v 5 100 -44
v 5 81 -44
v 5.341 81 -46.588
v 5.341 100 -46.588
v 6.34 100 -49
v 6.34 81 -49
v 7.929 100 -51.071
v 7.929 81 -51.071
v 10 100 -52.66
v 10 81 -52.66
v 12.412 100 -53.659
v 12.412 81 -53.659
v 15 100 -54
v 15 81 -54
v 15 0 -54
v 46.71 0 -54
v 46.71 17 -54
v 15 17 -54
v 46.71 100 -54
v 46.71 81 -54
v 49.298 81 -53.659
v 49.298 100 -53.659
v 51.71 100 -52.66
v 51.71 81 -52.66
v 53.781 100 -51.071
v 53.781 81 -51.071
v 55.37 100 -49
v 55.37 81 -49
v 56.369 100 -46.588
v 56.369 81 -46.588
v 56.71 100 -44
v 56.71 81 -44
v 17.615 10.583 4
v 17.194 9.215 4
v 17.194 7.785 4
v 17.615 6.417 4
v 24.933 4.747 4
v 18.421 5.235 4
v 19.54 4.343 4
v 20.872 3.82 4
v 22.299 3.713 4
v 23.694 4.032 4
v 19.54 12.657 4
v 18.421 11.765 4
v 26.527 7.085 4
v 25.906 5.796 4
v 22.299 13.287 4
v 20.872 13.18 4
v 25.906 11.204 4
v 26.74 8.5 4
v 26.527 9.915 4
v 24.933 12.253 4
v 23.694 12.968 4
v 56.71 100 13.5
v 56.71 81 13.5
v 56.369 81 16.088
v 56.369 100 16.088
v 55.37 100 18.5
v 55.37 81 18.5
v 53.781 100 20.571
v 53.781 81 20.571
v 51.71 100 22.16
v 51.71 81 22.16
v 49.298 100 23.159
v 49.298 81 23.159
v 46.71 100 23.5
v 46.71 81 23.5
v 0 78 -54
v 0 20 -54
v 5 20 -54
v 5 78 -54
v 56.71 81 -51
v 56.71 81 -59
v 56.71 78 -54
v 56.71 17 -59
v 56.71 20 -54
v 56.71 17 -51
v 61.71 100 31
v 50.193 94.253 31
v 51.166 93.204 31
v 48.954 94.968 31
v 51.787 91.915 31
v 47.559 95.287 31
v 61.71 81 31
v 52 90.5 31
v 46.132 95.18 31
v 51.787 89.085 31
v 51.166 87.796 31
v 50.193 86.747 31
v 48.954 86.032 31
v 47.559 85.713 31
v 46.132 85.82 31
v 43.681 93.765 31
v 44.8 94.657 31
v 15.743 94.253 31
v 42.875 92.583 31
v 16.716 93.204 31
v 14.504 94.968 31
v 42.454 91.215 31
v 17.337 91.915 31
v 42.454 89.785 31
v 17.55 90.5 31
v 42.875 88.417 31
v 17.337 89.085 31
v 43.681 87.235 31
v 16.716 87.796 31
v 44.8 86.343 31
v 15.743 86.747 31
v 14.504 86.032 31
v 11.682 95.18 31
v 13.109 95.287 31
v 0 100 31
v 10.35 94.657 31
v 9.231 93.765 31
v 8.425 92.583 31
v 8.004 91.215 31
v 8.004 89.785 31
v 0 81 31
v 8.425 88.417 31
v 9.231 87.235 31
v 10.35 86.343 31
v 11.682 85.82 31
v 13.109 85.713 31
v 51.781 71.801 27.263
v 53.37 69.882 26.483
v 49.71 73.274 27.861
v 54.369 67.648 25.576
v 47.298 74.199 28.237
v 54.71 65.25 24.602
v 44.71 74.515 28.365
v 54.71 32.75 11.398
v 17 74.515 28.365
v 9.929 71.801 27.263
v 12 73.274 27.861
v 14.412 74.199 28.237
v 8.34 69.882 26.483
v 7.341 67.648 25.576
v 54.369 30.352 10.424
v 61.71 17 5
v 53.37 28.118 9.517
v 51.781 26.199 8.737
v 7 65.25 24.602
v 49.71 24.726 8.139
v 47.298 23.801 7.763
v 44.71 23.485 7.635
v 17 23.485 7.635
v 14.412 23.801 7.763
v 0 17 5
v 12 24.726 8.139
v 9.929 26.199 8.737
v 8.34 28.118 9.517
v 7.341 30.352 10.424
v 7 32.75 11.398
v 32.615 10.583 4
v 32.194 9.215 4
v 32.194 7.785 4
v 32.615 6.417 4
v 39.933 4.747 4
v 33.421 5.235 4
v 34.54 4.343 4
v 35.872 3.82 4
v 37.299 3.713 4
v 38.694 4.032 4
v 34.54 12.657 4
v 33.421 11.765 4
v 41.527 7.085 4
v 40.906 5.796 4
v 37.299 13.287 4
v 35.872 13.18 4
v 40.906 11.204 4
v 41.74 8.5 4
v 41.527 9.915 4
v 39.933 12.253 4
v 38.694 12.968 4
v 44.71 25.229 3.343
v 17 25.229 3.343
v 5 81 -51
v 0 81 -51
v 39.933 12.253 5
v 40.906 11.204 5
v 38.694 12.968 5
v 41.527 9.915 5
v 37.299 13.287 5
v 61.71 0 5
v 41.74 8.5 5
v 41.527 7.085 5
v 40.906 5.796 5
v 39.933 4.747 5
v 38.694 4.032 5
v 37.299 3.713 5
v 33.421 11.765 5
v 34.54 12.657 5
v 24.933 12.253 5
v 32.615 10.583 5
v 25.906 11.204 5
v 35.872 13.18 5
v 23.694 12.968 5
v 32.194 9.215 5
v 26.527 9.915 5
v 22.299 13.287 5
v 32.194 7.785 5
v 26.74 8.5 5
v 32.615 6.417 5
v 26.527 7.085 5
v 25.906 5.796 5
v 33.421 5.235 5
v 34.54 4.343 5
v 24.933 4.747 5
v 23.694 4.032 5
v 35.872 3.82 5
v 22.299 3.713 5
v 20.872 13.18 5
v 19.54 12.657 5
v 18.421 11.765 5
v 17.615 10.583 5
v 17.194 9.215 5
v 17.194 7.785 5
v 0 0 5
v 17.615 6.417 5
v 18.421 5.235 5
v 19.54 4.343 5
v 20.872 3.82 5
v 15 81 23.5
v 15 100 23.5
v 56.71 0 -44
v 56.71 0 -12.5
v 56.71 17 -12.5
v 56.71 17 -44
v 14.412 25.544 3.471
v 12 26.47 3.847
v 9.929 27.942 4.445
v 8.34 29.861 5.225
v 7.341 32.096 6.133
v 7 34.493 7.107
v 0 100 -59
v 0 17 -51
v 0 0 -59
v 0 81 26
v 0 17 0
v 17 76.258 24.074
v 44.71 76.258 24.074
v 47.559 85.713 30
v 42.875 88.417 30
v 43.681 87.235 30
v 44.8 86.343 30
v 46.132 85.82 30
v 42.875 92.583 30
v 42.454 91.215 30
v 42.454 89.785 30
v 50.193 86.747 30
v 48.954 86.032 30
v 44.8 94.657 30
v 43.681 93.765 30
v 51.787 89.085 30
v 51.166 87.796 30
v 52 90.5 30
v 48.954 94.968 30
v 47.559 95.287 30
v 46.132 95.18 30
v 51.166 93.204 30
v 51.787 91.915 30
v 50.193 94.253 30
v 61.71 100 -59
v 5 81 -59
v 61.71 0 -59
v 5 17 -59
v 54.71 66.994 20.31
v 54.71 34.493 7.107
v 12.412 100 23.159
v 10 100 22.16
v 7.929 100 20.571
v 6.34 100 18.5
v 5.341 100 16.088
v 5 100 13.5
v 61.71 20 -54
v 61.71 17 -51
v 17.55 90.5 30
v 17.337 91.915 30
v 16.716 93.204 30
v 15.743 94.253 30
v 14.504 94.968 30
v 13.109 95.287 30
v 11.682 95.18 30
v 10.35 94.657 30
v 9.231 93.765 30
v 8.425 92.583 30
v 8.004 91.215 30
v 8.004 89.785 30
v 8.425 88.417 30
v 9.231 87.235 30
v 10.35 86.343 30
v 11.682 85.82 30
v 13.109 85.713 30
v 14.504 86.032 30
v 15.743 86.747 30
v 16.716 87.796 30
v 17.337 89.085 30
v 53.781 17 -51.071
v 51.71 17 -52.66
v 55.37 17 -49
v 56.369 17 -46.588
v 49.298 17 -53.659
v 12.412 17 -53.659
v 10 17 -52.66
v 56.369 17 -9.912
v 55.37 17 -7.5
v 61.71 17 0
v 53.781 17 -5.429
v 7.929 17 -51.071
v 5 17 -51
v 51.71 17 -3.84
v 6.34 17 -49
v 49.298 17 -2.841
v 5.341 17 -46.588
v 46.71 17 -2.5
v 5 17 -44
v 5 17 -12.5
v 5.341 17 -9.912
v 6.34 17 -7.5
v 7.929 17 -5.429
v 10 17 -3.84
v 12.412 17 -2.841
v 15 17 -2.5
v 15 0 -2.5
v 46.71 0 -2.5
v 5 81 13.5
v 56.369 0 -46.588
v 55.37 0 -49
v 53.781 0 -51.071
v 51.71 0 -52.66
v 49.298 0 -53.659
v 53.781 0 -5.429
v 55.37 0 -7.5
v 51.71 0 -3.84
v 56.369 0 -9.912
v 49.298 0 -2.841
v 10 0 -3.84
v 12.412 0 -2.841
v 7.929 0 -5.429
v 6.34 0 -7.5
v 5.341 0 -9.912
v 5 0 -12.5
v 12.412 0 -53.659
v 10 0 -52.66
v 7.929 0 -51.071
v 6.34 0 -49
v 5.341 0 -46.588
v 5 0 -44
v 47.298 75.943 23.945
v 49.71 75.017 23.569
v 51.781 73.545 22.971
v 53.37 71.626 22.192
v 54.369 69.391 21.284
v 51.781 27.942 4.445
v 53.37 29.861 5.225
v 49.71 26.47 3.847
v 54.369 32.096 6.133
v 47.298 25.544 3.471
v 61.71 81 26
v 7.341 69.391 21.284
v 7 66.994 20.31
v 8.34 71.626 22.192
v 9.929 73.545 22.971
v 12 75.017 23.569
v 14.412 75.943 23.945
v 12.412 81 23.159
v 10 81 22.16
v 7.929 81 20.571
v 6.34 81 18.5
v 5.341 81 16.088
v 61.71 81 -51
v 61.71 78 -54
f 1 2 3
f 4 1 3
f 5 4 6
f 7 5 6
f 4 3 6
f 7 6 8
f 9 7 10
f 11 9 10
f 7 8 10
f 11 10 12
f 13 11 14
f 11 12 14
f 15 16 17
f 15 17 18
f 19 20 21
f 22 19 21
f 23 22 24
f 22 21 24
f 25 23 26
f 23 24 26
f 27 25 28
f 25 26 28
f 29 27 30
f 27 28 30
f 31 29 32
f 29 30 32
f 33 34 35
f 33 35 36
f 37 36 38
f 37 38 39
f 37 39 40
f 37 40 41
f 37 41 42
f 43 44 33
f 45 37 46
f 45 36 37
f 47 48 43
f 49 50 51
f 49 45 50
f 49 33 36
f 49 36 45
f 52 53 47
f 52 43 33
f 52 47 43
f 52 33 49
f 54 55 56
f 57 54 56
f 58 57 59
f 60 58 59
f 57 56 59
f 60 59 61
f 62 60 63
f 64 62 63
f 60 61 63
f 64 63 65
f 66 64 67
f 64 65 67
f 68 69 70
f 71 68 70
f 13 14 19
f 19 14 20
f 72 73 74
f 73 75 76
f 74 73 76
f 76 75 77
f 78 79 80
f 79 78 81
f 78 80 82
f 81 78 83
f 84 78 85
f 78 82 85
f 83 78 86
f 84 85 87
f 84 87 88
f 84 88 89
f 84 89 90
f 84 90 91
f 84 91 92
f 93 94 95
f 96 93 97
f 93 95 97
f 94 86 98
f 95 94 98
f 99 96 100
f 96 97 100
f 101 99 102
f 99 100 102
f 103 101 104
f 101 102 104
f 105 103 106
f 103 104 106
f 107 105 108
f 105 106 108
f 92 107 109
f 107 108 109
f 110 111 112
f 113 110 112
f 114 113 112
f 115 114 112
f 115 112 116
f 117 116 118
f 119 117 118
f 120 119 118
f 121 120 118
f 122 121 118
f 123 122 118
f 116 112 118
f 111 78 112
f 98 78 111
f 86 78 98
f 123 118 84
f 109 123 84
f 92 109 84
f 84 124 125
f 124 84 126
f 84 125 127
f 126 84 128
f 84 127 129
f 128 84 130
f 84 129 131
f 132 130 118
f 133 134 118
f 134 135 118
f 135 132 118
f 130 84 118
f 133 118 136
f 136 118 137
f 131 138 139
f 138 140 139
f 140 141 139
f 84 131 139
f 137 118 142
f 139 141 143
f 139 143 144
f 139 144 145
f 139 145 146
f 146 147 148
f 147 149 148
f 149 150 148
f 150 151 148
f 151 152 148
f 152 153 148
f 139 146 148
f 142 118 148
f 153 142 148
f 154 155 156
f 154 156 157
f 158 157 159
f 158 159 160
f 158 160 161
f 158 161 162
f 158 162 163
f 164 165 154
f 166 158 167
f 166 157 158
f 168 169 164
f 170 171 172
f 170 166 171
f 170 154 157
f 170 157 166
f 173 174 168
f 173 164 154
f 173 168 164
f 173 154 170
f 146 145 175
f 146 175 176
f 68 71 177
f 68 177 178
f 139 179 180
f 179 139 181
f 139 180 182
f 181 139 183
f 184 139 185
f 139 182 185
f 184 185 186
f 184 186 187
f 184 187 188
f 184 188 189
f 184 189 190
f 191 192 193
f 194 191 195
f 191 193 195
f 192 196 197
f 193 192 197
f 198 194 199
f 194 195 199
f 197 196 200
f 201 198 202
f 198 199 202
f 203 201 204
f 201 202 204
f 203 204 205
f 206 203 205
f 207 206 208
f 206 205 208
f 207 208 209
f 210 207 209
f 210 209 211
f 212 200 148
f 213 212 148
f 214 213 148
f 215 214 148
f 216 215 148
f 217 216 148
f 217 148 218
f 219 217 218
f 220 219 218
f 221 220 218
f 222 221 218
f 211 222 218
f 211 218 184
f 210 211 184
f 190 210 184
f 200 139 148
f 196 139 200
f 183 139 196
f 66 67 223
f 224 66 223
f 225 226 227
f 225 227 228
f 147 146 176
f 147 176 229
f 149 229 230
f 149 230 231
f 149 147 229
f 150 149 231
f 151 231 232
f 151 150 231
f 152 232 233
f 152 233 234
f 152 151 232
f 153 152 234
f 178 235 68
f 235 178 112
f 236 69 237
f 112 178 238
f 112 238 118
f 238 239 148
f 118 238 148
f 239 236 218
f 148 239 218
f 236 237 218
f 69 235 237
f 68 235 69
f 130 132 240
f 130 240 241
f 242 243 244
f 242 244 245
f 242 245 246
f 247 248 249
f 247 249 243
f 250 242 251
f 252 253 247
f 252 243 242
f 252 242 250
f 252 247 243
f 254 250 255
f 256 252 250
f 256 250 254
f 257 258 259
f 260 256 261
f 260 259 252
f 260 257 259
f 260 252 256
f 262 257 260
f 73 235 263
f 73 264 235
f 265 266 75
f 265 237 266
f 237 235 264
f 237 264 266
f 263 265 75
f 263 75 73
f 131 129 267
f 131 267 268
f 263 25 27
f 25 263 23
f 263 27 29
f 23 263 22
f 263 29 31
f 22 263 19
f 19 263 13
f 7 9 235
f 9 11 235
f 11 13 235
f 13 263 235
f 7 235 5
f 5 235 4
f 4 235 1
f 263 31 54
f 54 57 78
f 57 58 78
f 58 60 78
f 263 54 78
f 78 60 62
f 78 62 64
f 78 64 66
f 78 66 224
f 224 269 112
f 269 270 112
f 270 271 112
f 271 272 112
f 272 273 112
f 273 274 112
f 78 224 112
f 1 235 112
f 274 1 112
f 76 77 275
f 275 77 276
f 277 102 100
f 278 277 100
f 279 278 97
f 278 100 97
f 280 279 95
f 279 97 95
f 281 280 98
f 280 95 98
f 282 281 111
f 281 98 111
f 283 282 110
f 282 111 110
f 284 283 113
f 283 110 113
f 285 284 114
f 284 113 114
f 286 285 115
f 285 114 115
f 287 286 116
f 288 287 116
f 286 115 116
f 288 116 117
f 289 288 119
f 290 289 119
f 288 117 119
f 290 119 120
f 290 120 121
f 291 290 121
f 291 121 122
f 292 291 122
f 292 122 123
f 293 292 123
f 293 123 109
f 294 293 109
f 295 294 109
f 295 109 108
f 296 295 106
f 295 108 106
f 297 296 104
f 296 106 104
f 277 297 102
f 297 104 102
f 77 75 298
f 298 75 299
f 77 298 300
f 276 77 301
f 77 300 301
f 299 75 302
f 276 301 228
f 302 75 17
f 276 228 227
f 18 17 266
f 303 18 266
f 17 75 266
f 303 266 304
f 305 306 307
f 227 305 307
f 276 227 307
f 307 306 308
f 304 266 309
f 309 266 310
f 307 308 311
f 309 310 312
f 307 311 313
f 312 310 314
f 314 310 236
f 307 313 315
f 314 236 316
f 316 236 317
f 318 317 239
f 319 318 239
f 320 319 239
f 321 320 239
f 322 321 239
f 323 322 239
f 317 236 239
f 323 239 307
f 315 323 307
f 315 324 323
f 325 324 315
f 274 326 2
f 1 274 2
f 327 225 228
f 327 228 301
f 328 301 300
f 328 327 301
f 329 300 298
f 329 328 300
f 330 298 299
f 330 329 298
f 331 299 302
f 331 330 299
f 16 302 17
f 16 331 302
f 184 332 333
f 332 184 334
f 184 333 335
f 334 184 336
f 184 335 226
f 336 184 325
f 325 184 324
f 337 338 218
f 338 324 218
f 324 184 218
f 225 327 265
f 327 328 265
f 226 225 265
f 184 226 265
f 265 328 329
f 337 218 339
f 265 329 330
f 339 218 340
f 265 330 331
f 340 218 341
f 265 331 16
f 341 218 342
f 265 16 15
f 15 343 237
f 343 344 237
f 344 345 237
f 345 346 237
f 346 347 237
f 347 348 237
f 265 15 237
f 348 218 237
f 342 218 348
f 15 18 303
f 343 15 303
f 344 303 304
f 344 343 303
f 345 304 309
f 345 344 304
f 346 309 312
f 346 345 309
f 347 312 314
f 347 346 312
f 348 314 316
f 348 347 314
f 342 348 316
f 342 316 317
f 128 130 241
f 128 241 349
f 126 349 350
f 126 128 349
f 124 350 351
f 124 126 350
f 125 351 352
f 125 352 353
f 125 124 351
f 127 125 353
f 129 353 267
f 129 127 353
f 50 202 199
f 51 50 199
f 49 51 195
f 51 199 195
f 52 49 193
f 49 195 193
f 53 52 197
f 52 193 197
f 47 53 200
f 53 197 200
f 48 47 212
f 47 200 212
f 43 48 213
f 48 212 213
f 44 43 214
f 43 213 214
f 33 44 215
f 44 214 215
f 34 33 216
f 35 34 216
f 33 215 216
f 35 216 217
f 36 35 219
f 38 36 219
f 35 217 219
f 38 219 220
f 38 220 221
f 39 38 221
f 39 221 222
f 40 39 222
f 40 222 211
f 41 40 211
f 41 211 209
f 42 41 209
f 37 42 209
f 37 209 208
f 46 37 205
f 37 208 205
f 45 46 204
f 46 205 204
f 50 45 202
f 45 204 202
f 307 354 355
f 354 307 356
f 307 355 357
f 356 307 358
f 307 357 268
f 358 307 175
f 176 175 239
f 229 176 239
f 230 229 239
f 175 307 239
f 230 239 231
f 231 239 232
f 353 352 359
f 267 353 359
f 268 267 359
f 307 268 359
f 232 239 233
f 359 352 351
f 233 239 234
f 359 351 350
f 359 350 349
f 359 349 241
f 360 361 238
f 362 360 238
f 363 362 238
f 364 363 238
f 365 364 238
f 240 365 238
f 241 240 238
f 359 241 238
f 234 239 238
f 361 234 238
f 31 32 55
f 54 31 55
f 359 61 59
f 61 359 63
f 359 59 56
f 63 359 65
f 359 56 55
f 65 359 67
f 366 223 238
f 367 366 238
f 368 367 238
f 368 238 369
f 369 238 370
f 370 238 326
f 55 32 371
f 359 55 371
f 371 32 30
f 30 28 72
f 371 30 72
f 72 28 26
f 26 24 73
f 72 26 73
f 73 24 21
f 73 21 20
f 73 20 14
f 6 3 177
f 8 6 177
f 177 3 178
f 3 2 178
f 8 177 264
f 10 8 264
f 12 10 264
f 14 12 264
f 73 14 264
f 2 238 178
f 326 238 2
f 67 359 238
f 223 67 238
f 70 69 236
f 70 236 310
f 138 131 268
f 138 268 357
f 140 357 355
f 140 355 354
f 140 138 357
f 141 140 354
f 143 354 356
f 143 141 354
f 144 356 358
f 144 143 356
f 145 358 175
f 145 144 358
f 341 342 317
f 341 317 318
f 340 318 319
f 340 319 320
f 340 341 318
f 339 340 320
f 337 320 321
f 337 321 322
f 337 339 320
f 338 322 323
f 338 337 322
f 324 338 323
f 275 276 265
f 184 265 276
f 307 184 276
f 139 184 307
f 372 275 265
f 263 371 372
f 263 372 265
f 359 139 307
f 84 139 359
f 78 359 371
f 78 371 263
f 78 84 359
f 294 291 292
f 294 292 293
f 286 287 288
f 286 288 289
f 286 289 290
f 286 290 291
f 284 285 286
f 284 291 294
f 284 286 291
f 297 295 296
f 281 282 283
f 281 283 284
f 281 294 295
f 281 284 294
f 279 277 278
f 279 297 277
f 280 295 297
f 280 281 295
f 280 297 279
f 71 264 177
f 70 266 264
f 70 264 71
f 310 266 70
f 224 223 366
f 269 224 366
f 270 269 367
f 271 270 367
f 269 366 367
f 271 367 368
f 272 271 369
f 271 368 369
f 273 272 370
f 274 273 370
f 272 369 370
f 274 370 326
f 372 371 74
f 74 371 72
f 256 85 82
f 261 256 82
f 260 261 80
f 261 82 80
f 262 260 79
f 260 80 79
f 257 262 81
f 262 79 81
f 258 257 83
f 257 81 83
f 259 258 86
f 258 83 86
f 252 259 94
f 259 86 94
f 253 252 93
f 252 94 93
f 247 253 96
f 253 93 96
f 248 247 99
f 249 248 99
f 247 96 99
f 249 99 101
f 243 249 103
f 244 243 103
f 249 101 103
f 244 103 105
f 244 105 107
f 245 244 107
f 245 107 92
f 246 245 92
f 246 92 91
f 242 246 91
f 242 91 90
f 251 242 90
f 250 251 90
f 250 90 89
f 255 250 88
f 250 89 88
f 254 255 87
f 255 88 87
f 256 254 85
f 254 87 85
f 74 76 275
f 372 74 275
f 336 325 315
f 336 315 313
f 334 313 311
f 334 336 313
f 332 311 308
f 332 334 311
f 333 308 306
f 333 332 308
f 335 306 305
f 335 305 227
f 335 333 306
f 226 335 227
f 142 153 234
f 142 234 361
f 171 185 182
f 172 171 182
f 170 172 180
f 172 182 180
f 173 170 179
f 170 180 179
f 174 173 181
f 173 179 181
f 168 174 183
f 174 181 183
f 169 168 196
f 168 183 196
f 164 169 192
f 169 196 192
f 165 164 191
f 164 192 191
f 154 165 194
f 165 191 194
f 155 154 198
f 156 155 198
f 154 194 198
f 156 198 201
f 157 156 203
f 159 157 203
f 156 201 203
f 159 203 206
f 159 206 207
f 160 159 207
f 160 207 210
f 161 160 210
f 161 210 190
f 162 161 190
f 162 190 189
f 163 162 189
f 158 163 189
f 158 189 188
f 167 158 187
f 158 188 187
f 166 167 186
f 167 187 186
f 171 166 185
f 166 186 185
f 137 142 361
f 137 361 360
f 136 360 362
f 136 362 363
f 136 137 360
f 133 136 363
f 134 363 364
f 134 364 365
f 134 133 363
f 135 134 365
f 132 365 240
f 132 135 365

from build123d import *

# Parameters (mm, degrees)
BOSS_EXTRUDE1_DEPTH = 58.71
SKETCH4_R           = 4.8
CUT_EXTRUDE1_DEPTH  = 1
SKETCH5_R           = 4.8
CUT_EXTRUDE2_DEPTH  = 1
SKETCH6_W           = 19
SKETCH6_H           = 26
BOSS_EXTRUDE3_DEPTH = 58.71
SKETCH7_W           = 58.71
SKETCH7_H           = 17
SKETCH7_H_2         = 19
BOSS_EXTRUDE4_DEPTH = 59
BOSS_EXTRUDE5_DEPTH = 3
CUT_EXTRUDE3_DEPTH  = 17
CUT_EXTRUDE4_START  = -19
CUT_EXTRUDE4_DEPTH  = 19
CUT_EXTRUDE5_DEPTH  = 4.632332886
SKETCH12_W          = 5
SKETCH12_H          = 5
BOSS_EXTRUDE6_DEPTH = 100
CHAMFER1_SIZE       = 3


with BuildPart() as part:
    # Sketch3 → Boss-Extrude1 (new body)
    with BuildSketch(Plane.YZ):
        Polygon((0, 5), (0, 0), (17, 0), (81, 26), (100, 26), (100, 31), (81, 31), (17, 5), align=None)
    extrude(amount=BOSS_EXTRUDE1_DEPTH)

    # Sketch4 → Cut-Extrude1 (cut)
    with BuildSketch(Plane.XY.offset(31)):
        with Locations((12.75, 90.5)):
            Circle(SKETCH4_R)
        with Locations((47.2, 90.5)):
            Circle(SKETCH4_R)
    extrude(amount=-CUT_EXTRUDE1_DEPTH, mode=Mode.SUBTRACT)

    # Sketch5 → Cut-Extrude2 (cut)
    with BuildSketch(Plane.XY.offset(5)):
        with Locations((21.94, 8.5)):
            Circle(SKETCH5_R)
        with Locations((36.94, 8.5)):
            Circle(SKETCH5_R)
    extrude(amount=-CUT_EXTRUDE2_DEPTH, mode=Mode.SUBTRACT)

    # Sketch6 → Boss-Extrude3 (add)
    with BuildSketch(Plane.YZ.offset(58.71)):
        with Locations((90.5, 13)):
            Rectangle(SKETCH6_W, SKETCH6_H)
    extrude(amount=-BOSS_EXTRUDE3_DEPTH)

    # Sketch7 → Boss-Extrude4 (add)
    with BuildSketch(Plane(origin=(0, 0, 0), x_dir=(1, 0, 0), z_dir=(0, 0, -1))):
        with Locations((29.355, -8.5)):
            Rectangle(SKETCH7_W, SKETCH7_H)
        with Locations((29.355, -90.5)):
            Rectangle(SKETCH7_W, SKETCH7_H_2)
    extrude(amount=BOSS_EXTRUDE4_DEPTH)

    # Sketch8 → Boss-Extrude5 (add)
    with BuildSketch(Plane.YZ.offset(58.71)):
        Polygon((100, 31), (81, 31), (17, 5), (0, 5), (0, -59), (17, -59), (17, 0), (81, 26), (81, -59), (100, -59), align=None)
    extrude(amount=BOSS_EXTRUDE5_DEPTH)

    # Sketch9 → Cut-Extrude3 (cut)
    with BuildSketch(Plane.XZ):
        with BuildLine():
            Line((15, -2.5), (46.71, -2.5))
            ThreePointArc((46.71, -2.5), (53.781067812, -5.428932188), (56.71, -12.5))
            Line((56.71, -12.5), (56.71, -44))
            ThreePointArc((56.71, -44), (53.781067812, -51.071067812), (46.71, -54))
            Line((46.71, -54), (15, -54))
            ThreePointArc((15, -54), (7.928932188, -51.071067812), (5, -44))
            Line((5, -44), (5, -12.5))
            ThreePointArc((5, -12.5), (7.928932188, -5.428932188), (15, -2.5))
        make_face()
    extrude(amount=-CUT_EXTRUDE3_DEPTH, mode=Mode.SUBTRACT)

    # Sketch10 → Cut-Extrude4 (cut)
    with BuildSketch(Plane(origin=(0, 100, 0), x_dir=(-1, 0, 0), z_dir=(0, 1, 0)).offset(CUT_EXTRUDE4_START)):
        with BuildLine():
            Line((-46.71, 23.5), (-15, 23.5))
            ThreePointArc((-15, 23.5), (-7.928932188, 20.571067812), (-5, 13.5))
            Line((-5, 13.5), (-5, -44))
            ThreePointArc((-5, -44), (-7.928932188, -51.071067812), (-15, -54))
            Line((-15, -54), (-46.71, -54))
            ThreePointArc((-46.71, -54), (-53.781067812, -51.071067812), (-56.71, -44))
            Line((-56.71, -44), (-56.71, 13.5))
            ThreePointArc((-56.71, 13.5), (-53.781067812, 20.571067812), (-46.71, 23.5))
        make_face()
    extrude(amount=CUT_EXTRUDE4_DEPTH, mode=Mode.SUBTRACT)

    # Sketch11 → Cut-Extrude5 (cut)
    with BuildSketch(Plane(origin=(0, 0.664710813, -1.636211232), x_dir=(1, 0, 0), z_dir=(0, -0.376377046955938, 0.9264665771223093))):
        with BuildLine():
            Line((17, 79.711481203), (44.71, 79.711481203))
            ThreePointArc((44.71, 79.711481203), (51.781067812, 76.782549014), (54.71, 69.711481203))
            Line((54.71, 69.711481203), (54.71, 34.631817046))
            ThreePointArc((54.71, 34.631817046), (51.781067812, 27.560749234), (44.71, 24.631817046))
            Line((44.71, 24.631817046), (17, 24.631817046))
            ThreePointArc((17, 24.631817046), (9.928932188, 27.560749234), (7, 34.631817046))
            Line((7, 34.631817046), (7, 69.711481203))
            ThreePointArc((7, 69.711481203), (9.928932188, 76.782549014), (17, 79.711481203))
        make_face()
    extrude(amount=-CUT_EXTRUDE5_DEPTH, mode=Mode.SUBTRACT)

    # Sketch12 → Boss-Extrude6 (add)
    with BuildSketch(Plane.XZ):
        with Locations((2.5, -56.5)):
            Rectangle(SKETCH12_W, SKETCH12_H)
        with Locations((59.21, -56.5)):
            Rectangle(SKETCH12_W, SKETCH12_H)
    extrude(amount=-BOSS_EXTRUDE6_DEPTH)

    # Chamfer1
    chamfer1_edges = [part.edges().sort_by_distance(p)[0] for p in [
        (2.5, 17, -54),
        (2.5, 81, -54),
        (59.21, 81, -54),
        (59.21, 17, -54),
    ]]
    chamfer(chamfer1_edges, length=CHAMFER1_SIZE)


solid = part.part
